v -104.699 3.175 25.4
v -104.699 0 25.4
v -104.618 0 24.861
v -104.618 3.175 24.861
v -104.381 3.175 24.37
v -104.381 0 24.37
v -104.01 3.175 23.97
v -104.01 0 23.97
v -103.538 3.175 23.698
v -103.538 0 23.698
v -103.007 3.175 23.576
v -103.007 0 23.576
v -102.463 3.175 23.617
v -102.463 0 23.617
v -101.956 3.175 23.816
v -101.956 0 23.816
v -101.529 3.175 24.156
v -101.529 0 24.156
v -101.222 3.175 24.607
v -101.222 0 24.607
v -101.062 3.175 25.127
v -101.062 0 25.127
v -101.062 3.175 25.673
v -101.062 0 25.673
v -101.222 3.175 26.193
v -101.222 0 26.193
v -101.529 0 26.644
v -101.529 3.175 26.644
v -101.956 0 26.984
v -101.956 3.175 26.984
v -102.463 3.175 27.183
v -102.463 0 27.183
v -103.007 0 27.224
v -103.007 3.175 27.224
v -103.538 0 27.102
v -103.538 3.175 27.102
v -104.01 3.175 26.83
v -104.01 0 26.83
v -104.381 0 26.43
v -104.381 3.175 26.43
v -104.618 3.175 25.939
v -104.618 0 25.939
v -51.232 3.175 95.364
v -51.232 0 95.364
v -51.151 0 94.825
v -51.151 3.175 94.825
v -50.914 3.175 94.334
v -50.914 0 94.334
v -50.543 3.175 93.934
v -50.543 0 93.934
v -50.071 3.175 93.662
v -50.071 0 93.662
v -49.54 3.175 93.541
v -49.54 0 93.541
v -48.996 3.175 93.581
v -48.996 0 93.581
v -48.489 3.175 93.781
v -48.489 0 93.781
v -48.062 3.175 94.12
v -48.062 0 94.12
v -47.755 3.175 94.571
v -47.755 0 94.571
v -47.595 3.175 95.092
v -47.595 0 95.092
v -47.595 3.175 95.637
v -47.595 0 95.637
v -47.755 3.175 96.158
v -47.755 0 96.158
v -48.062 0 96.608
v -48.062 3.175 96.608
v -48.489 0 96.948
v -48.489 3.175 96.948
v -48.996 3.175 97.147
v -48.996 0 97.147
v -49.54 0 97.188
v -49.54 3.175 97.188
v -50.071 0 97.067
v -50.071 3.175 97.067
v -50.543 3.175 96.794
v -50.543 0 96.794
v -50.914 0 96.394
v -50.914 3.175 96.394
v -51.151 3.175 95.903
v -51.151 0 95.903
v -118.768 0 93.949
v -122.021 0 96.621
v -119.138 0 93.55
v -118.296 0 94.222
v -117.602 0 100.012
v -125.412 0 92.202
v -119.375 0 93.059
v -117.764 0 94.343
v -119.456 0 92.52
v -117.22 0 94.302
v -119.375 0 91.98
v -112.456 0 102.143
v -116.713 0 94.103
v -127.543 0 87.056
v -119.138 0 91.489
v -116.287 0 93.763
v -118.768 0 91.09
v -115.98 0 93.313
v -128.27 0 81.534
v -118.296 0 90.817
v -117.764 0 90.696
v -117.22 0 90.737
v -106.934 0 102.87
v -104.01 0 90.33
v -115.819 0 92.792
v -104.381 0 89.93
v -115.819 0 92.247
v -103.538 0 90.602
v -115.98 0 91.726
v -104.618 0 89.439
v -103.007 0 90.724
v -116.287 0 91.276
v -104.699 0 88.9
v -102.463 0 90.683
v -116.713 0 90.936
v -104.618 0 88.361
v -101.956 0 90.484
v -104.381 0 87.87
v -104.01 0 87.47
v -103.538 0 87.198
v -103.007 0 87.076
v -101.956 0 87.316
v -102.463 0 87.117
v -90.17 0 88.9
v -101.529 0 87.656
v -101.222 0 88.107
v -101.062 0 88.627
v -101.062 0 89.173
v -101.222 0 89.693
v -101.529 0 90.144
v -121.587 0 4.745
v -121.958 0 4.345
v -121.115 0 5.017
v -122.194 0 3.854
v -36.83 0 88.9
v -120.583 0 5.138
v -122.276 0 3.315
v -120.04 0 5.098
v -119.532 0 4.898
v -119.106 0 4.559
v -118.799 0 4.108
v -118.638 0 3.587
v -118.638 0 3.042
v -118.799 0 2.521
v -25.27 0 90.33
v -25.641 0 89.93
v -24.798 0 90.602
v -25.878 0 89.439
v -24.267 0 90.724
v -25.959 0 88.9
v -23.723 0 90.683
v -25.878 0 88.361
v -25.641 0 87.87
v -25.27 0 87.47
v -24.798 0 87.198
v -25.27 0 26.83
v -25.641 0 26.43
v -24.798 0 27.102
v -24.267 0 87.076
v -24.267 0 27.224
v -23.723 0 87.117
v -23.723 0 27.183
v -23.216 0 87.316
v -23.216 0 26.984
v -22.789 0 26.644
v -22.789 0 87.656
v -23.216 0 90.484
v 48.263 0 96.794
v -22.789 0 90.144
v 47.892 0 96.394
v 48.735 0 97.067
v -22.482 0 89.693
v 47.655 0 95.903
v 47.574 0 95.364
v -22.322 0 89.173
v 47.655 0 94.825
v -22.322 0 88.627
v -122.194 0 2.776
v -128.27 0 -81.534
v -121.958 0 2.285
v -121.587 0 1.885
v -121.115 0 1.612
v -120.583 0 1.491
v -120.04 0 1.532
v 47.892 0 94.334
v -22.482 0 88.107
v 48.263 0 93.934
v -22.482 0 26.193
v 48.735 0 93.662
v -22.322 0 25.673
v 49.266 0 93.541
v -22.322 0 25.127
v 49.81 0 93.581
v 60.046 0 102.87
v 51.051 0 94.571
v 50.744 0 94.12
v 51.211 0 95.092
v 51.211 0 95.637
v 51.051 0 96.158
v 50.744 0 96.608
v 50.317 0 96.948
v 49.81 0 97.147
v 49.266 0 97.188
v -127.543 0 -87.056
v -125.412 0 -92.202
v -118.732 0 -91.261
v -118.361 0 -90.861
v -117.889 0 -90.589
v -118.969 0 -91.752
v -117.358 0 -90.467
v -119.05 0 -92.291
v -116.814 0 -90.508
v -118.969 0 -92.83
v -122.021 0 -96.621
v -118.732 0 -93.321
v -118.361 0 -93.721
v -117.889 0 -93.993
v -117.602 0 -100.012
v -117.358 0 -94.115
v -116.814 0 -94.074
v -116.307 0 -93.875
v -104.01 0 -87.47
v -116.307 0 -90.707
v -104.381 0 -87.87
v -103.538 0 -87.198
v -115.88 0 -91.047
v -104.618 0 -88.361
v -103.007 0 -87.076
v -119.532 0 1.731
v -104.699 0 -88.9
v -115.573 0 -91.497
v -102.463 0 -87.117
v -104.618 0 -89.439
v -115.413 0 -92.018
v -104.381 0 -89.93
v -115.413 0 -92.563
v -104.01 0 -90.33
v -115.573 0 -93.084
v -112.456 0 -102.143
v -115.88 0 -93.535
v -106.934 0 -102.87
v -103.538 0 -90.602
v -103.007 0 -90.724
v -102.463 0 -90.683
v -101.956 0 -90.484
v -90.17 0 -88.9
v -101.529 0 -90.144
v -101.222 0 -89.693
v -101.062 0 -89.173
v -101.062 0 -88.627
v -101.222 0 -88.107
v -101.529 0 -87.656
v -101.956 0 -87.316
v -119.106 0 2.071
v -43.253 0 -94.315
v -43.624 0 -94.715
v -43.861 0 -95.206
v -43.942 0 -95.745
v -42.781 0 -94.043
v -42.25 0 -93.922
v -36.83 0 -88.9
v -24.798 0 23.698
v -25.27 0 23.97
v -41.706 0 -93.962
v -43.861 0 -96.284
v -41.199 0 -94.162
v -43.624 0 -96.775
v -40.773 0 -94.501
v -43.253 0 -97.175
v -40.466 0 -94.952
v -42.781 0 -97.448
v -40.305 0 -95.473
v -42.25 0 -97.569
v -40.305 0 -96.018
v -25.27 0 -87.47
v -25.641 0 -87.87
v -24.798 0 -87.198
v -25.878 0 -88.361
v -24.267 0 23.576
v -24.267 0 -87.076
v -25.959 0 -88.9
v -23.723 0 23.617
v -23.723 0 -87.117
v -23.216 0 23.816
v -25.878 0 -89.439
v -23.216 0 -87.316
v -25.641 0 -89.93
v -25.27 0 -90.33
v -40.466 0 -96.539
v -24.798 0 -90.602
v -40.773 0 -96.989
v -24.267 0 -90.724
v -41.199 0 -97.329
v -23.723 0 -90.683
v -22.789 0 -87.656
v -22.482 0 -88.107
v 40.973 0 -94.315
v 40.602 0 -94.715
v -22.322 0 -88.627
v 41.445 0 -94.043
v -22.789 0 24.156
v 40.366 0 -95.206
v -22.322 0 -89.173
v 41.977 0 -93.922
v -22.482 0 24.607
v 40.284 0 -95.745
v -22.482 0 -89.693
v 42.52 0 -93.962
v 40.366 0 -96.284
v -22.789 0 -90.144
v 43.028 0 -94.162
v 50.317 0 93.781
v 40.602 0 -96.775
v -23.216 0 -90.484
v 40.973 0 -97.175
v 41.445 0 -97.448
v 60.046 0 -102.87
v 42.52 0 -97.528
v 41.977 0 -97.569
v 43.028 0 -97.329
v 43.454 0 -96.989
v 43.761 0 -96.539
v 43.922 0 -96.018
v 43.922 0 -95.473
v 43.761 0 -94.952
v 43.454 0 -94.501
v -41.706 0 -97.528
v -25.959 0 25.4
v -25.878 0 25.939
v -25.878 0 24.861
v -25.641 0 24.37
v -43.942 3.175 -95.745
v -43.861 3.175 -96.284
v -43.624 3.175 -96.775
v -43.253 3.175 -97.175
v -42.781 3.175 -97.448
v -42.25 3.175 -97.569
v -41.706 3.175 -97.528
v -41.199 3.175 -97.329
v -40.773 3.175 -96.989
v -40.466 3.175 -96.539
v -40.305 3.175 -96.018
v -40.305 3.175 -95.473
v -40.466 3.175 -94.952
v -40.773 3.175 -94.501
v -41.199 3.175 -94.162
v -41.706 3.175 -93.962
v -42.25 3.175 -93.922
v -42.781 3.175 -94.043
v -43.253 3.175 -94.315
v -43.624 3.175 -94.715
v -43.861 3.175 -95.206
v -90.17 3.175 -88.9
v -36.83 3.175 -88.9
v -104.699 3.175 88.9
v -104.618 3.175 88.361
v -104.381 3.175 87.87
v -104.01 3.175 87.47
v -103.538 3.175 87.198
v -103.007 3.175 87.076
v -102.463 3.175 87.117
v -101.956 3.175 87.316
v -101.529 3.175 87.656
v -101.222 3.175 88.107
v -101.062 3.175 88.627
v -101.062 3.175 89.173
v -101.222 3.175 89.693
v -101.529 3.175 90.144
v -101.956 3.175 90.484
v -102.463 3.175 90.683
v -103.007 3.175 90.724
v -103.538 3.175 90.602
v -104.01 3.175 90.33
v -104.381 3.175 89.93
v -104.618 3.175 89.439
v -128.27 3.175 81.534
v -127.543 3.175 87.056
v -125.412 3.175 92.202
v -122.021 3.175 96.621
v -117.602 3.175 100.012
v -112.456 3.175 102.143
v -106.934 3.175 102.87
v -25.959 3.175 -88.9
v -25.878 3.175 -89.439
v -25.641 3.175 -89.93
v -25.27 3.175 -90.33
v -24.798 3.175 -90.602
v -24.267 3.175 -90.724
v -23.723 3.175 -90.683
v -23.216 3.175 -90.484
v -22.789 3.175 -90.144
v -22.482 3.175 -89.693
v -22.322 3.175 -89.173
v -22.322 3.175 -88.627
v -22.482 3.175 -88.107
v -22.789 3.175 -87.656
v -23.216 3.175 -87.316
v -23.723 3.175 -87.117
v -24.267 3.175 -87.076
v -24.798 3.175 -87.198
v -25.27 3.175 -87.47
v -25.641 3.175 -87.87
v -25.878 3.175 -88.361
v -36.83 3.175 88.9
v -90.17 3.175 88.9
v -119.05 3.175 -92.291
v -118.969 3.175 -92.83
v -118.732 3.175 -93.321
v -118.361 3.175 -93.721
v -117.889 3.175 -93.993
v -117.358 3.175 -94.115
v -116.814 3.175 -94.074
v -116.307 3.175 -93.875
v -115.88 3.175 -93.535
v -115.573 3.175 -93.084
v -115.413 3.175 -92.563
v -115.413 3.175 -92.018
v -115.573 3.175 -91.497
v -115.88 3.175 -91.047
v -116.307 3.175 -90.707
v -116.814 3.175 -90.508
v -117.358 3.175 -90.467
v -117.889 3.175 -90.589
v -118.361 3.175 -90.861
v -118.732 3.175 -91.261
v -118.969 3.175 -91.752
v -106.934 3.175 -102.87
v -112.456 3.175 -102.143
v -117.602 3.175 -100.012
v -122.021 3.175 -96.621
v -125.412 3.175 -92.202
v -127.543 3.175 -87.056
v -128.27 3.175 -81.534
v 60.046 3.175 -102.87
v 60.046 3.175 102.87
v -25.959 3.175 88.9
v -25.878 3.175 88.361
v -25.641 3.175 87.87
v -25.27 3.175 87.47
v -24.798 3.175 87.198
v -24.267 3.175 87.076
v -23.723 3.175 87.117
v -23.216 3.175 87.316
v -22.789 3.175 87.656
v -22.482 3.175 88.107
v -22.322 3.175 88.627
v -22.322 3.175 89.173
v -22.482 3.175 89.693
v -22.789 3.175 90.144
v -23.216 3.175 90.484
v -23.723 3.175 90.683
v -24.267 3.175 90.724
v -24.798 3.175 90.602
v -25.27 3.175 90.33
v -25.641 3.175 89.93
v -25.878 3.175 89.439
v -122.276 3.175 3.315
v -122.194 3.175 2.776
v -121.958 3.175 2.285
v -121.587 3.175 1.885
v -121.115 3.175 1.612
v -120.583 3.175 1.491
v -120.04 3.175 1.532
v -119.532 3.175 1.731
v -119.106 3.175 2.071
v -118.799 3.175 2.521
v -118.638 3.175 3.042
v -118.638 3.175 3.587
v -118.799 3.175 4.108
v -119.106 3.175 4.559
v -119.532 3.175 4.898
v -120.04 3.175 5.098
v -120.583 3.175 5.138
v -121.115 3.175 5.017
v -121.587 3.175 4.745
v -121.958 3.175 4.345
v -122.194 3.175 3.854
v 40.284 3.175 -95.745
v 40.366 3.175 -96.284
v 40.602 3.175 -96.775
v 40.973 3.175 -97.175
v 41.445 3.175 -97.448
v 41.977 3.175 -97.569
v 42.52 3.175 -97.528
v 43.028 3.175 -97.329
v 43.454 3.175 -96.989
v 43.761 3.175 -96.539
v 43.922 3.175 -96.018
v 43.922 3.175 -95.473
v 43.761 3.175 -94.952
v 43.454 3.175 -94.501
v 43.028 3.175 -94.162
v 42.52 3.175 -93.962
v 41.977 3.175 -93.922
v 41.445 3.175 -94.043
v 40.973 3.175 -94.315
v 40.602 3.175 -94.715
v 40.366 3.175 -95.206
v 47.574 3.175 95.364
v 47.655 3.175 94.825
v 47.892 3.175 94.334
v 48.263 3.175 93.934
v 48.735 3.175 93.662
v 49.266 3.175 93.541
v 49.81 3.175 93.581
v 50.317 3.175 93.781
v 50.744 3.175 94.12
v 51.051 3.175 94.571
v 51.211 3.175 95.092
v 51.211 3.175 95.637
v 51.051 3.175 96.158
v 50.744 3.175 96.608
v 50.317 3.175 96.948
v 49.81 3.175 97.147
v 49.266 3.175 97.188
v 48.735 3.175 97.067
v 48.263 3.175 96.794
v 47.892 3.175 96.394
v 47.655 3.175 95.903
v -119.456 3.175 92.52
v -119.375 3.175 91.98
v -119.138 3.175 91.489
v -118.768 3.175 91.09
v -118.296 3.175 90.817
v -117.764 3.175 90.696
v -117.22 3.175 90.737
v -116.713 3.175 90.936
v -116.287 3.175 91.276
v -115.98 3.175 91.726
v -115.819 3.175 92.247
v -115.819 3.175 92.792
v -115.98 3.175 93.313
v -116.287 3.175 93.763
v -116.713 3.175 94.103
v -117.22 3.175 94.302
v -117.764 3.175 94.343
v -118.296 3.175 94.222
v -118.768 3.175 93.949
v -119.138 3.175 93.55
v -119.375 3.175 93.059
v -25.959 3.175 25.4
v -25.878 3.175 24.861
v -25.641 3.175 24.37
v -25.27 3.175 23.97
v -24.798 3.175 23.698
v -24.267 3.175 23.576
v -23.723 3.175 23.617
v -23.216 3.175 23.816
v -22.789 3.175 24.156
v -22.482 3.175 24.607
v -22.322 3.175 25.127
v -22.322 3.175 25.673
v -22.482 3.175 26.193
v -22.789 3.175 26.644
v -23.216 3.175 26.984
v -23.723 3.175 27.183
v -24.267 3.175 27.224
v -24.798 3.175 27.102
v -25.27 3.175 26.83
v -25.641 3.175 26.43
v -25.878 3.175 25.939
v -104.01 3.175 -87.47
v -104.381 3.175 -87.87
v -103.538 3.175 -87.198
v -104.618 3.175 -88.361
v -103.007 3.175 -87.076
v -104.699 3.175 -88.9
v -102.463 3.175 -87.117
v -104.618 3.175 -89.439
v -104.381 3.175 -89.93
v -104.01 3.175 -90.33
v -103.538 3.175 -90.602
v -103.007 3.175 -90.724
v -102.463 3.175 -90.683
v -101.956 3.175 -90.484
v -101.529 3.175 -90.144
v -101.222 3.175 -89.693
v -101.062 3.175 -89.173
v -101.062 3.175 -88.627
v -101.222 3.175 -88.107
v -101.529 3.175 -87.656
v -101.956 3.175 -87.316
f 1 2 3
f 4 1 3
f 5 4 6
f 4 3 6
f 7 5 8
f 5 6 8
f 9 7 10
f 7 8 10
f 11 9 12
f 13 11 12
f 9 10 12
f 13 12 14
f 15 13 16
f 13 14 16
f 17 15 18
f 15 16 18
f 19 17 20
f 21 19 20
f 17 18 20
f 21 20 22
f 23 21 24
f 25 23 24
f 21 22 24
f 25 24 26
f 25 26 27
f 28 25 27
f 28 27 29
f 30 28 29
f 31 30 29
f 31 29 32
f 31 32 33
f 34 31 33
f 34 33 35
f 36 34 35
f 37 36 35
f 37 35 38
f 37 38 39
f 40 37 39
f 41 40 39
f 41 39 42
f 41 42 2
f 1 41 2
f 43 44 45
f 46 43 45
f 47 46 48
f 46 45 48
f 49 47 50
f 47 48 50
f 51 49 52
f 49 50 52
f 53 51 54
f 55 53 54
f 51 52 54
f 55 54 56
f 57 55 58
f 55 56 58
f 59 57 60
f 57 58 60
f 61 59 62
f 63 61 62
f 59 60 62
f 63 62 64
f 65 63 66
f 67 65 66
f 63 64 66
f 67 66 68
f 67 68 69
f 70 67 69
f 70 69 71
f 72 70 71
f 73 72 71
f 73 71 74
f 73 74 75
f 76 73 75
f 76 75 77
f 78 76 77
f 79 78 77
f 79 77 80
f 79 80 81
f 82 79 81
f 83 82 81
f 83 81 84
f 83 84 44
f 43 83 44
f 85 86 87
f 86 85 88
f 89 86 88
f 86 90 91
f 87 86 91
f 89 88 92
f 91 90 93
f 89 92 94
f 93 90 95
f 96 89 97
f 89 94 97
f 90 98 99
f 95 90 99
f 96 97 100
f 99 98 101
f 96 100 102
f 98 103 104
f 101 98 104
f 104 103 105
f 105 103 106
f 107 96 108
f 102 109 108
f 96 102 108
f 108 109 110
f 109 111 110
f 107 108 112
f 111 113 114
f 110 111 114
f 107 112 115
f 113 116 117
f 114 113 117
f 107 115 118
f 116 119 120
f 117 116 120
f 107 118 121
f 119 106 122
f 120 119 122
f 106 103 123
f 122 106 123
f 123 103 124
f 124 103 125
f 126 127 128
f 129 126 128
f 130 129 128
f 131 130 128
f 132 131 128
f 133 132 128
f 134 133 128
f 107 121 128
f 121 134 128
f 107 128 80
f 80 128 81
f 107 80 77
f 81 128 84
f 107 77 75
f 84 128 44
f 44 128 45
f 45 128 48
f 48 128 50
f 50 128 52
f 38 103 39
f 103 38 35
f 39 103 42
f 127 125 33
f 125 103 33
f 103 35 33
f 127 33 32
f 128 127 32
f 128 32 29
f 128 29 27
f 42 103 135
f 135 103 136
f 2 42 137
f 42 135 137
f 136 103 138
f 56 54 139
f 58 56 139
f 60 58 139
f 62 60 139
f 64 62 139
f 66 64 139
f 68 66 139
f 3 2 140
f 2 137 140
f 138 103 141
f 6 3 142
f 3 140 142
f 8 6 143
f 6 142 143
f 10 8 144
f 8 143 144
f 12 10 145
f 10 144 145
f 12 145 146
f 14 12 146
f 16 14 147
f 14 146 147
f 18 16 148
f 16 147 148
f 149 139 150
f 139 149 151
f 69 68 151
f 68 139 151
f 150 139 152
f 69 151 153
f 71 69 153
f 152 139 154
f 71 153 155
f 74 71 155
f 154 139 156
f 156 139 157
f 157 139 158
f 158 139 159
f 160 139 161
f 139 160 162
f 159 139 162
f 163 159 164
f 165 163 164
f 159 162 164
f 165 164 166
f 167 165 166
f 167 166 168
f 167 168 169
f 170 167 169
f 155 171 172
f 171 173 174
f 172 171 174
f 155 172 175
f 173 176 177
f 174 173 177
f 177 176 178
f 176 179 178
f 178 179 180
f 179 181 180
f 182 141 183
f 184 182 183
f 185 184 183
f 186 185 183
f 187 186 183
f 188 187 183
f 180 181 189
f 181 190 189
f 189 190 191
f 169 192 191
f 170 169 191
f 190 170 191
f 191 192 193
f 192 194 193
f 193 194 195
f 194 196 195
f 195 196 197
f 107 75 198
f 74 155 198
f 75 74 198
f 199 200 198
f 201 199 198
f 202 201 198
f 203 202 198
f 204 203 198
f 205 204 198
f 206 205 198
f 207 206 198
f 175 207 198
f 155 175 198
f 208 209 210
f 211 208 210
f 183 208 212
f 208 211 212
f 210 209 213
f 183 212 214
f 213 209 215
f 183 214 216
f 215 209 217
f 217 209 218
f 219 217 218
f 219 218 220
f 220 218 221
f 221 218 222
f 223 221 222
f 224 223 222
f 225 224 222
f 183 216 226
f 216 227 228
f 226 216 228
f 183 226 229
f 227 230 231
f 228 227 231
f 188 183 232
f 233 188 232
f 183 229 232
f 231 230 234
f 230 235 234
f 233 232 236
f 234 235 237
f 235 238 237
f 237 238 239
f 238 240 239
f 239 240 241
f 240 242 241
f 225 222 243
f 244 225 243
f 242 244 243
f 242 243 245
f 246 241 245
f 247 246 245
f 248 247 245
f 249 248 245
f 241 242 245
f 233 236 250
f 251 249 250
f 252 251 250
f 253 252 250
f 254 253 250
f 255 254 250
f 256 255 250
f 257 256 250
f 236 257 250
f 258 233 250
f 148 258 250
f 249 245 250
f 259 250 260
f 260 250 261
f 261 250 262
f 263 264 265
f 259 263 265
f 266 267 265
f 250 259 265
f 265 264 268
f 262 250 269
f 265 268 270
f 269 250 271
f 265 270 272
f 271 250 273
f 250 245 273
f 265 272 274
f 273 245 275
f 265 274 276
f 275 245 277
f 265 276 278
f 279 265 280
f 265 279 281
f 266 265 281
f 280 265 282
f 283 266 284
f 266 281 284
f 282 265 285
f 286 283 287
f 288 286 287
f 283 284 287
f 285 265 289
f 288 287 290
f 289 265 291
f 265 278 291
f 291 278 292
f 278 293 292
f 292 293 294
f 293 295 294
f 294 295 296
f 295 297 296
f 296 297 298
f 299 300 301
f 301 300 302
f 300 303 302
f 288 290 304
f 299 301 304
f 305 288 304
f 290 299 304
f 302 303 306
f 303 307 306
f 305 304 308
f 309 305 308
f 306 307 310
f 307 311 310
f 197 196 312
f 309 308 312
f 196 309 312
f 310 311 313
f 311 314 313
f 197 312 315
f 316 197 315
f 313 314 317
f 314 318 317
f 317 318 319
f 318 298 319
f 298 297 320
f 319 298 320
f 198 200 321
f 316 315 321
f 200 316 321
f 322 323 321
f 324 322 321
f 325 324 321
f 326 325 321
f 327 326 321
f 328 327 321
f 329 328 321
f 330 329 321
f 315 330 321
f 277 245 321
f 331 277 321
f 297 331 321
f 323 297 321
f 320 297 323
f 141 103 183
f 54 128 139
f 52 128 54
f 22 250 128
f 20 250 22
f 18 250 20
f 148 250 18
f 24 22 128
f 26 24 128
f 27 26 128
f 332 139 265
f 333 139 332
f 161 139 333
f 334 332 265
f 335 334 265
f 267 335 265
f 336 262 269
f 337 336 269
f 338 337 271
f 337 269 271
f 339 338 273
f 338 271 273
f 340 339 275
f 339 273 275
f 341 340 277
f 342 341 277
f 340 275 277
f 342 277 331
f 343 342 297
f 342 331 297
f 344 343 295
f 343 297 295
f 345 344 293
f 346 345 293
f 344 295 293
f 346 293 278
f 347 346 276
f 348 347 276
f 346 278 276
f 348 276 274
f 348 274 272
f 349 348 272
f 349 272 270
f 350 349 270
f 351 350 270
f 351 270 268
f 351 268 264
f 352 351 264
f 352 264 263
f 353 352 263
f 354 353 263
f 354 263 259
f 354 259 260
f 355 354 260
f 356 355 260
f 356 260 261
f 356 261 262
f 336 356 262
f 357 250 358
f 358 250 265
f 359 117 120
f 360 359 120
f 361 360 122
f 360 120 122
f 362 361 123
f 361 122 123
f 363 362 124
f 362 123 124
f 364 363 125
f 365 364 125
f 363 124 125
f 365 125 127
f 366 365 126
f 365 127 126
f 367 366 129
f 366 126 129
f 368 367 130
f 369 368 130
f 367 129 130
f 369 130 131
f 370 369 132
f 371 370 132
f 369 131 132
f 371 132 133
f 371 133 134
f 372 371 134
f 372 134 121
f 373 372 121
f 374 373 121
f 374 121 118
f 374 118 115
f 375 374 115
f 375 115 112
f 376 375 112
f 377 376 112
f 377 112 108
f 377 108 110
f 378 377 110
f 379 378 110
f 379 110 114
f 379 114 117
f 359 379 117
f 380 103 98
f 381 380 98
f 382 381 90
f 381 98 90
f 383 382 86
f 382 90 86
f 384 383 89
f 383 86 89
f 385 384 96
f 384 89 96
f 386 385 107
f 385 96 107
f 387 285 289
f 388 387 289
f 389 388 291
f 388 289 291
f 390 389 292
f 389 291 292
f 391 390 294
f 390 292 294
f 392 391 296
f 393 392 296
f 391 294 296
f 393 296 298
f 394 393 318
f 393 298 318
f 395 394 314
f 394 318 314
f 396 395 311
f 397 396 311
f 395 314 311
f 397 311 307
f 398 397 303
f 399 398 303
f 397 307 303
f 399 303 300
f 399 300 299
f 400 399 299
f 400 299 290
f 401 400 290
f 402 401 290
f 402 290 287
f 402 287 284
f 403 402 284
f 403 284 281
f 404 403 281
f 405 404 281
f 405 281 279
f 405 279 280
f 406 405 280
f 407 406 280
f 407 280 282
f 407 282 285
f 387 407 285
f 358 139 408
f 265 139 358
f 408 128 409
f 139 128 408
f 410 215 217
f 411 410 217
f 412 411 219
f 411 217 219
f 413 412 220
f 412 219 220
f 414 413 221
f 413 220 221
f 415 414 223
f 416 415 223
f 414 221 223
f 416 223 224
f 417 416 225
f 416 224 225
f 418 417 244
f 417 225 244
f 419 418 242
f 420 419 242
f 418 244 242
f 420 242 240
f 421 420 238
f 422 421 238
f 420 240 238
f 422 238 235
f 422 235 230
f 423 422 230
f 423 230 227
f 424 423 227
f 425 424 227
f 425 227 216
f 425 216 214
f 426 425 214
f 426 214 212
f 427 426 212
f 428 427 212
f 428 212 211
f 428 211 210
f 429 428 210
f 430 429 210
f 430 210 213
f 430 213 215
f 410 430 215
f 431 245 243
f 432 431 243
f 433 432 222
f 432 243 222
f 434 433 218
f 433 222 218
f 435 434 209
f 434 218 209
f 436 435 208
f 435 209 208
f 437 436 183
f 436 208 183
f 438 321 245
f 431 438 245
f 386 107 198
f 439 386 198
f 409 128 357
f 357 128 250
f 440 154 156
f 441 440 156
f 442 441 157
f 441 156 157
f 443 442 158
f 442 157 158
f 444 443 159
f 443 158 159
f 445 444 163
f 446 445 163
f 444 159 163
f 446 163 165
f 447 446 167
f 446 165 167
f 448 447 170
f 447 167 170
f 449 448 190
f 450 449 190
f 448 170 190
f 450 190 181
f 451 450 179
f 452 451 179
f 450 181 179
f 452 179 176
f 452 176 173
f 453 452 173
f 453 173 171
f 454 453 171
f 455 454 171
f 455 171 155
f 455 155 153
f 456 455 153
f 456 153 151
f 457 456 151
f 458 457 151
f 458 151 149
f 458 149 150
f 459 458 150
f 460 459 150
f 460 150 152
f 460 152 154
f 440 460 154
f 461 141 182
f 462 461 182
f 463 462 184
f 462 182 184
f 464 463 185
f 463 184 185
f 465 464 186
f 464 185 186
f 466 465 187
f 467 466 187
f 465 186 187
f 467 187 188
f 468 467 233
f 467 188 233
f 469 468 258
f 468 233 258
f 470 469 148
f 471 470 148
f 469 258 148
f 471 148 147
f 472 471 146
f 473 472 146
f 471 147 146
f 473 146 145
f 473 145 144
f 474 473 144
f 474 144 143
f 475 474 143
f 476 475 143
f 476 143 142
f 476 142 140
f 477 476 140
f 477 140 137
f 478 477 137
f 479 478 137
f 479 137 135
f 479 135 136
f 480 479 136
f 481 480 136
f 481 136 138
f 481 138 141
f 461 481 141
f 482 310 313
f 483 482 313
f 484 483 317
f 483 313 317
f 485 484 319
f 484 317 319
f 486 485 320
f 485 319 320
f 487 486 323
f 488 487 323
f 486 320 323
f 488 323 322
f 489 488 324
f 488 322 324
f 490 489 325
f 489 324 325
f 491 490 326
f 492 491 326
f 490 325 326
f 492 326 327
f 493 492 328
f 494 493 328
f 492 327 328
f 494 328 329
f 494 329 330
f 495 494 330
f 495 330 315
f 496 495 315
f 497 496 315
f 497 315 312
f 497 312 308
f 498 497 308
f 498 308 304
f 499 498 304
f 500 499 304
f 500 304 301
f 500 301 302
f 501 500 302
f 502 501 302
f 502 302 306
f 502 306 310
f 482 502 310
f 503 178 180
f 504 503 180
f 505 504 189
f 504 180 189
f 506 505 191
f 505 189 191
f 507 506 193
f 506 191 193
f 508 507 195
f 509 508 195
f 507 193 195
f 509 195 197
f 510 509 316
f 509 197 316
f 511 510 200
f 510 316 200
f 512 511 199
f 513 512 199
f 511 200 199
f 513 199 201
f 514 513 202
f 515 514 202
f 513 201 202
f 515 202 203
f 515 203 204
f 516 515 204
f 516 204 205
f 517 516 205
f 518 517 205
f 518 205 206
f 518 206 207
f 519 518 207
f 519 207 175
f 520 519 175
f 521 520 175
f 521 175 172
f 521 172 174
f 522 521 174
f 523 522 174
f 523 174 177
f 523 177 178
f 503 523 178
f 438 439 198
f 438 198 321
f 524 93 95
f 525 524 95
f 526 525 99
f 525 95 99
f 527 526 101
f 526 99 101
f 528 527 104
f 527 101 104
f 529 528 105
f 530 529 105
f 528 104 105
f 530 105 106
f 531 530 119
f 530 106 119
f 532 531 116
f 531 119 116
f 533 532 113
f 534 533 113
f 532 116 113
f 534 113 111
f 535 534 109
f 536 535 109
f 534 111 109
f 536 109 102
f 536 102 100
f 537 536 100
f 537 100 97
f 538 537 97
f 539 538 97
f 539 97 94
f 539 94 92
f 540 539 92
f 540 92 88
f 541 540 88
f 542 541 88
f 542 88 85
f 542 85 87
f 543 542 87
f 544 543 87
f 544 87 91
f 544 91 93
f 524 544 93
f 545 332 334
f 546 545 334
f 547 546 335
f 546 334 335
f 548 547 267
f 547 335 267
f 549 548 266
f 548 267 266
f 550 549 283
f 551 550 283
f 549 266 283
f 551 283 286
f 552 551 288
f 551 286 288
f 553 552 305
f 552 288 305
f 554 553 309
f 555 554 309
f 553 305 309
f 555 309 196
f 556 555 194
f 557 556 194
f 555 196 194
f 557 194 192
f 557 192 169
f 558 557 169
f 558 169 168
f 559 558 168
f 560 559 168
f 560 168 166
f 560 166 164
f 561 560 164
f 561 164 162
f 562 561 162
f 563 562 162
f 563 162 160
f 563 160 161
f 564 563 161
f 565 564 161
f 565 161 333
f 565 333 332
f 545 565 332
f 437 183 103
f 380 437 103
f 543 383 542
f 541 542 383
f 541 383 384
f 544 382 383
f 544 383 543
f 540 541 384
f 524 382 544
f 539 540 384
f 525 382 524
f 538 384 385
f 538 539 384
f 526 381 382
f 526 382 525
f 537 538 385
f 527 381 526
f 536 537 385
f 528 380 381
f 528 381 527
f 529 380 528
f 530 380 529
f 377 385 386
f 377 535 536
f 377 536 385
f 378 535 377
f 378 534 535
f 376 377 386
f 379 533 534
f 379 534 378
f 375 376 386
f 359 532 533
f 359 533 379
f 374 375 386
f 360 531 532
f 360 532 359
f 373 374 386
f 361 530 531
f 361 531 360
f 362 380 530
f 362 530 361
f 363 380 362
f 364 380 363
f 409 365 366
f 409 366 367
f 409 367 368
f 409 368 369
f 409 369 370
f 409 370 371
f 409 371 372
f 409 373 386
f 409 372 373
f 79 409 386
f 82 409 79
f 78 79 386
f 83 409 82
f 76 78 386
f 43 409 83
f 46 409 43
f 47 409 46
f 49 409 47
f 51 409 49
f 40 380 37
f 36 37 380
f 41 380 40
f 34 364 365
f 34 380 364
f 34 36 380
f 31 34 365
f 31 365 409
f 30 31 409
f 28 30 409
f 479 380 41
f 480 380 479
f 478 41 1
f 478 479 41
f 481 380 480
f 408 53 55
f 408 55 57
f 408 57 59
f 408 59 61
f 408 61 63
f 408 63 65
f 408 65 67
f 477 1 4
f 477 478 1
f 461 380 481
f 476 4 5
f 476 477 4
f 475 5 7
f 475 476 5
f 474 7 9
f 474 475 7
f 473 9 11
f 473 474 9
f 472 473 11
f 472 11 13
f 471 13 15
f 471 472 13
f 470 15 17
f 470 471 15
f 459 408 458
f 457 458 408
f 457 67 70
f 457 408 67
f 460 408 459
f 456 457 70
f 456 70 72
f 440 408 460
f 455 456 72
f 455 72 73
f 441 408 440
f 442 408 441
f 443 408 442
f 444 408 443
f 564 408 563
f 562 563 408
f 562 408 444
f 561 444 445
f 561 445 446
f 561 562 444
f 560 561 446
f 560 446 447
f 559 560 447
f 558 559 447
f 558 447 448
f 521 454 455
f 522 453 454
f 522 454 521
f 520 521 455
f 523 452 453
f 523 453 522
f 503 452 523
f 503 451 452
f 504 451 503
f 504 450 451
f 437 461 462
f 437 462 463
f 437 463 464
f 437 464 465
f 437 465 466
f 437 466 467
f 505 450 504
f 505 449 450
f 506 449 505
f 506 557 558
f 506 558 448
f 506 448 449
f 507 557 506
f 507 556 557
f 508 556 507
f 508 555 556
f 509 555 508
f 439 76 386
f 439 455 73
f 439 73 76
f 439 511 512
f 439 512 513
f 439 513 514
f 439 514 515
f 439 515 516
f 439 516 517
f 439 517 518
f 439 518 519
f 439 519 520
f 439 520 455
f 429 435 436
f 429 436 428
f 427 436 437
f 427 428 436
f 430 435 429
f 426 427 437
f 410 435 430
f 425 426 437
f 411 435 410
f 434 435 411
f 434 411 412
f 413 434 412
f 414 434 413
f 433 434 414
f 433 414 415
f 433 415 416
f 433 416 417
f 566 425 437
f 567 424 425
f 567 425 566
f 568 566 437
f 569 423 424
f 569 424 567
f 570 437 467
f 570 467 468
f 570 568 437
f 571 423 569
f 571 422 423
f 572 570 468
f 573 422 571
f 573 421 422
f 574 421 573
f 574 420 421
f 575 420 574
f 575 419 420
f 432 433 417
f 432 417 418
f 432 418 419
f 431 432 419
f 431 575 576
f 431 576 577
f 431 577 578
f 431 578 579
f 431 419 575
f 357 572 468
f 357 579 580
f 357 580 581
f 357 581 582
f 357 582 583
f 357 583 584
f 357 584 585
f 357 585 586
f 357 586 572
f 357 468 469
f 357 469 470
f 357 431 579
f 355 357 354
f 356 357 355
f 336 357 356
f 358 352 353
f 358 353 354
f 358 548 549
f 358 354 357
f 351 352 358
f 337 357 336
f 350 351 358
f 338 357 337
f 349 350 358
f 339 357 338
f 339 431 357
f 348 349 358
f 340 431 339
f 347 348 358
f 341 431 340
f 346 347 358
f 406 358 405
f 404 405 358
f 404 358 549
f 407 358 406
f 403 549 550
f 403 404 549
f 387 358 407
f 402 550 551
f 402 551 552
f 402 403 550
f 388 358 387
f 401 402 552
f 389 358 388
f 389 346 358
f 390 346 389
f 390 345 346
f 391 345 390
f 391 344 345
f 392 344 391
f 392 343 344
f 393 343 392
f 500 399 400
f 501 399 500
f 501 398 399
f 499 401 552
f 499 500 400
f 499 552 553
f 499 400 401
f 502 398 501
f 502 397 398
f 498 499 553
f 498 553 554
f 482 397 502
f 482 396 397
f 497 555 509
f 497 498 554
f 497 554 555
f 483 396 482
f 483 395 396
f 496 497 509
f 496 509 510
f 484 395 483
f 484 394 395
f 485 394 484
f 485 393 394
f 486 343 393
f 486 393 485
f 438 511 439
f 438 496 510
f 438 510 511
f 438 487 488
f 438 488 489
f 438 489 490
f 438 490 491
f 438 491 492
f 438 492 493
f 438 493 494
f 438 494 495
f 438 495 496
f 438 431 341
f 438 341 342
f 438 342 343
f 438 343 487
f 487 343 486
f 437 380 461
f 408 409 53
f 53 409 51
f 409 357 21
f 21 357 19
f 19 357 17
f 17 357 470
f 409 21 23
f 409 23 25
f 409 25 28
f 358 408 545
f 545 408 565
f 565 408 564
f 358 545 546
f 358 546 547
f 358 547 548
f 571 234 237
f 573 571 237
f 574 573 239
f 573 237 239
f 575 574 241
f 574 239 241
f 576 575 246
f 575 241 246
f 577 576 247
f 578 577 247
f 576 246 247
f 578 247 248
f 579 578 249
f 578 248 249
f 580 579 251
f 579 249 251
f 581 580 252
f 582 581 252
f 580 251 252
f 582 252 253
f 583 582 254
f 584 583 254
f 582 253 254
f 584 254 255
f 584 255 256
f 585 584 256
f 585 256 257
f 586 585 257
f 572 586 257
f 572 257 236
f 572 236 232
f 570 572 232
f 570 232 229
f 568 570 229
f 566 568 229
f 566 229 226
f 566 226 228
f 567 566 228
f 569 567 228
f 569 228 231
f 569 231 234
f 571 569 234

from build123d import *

# Parameters (mm, degrees)
BOSS_EXTRUDE1_DEPTH         = 3.175
SKETCH3_W                   = 53.34
SKETCH3_H                   = 177.8
CUT_EXTRUDE1_DEPTH          = 3.175
F_27_0_144_DIAMETER_HOLE2_D = 3.6576
F_27_0_144_DIAMETER_HOLE3_D = 3.6576
SKETCH12_W                  = 127
SKETCH12_H                  = 254
CUT_EXTRUDE2_DEPTH          = 25.4


with BuildPart() as part:
    # Sketch2 → Boss-Extrude1 (new body)
    with BuildSketch(Plane(origin=(0, 0, 0), x_dir=(1, 0, 0), z_dir=(0, 1, 0))):
        with BuildLine():
            Line((-106.934, -102.87), (106.934, -102.87))
            ThreePointArc((106.934, -102.87), (122.020830283, -96.620830283), (128.27, -81.534))
            Line((128.27, -81.534), (128.27, 81.534))
            ThreePointArc((128.27, 81.534), (122.020830283, 96.620830283), (106.934, 102.87))
            Line((106.934, 102.87), (-106.934, 102.87))
            ThreePointArc((-106.934, 102.87), (-122.020830283, 96.620830283), (-128.27, 81.534))
            Line((-128.27, 81.534), (-128.27, -81.534))
            ThreePointArc((-128.27, -81.534), (-122.020830283, -96.620830283), (-106.934, -102.87))
        make_face()
    extrude(amount=BOSS_EXTRUDE1_DEPTH)

    # Sketch3 → Cut-Extrude1 (cut)
    with BuildSketch(Plane(origin=(0, 0, 0), x_dir=(1, 0, 0), z_dir=(0, 1, 0))):
        with Locations((-63.5, 0)):
            Rectangle(SKETCH3_W, SKETCH3_H)
    extrude(amount=CUT_EXTRUDE1_DEPTH, mode=Mode.SUBTRACT)

    # #27 (0.144) Diameter Hole2 (through all)
    with Locations(Plane(origin=(0, 3.175, 0), x_dir=(1, 0, 0), z_dir=(0, 1, 0))):
        with Locations((-24.13, -25.4), (-24.13, 88.9), (-102.87, 88.9), (-102.87, -25.4), (-102.87, -88.9), (-24.13, -88.9)):
            Hole(F_27_0_144_DIAMETER_HOLE2_D / 2)

    # #27 (0.144) Diameter Hole3 (through all)
    with Locations(Plane(origin=(0, 3.175, 0), x_dir=(1, 0, 0), z_dir=(0, 1, 0))):
        with Locations((-42.1132, 95.7453), (42.1132, 95.7453), (117.221, 92.2909), (117.6274, -92.5195), (49.403, -95.3643), (120.4468, -3.3147), (-49.403, -95.3643), (-117.6274, -92.5195), (-120.4468, -3.3147), (-117.221, 92.2909)):
            Hole(F_27_0_144_DIAMETER_HOLE3_D / 2)

    # Sketch12 → Cut-Extrude2 (cut)
    with BuildSketch(Plane(origin=(0, 3.175, 0), x_dir=(1, 0, 0), z_dir=(0, 1, 0))):
        with Locations((123.5456, 0)):
            Rectangle(SKETCH12_W, SKETCH12_H)
    extrude(amount=-CUT_EXTRUDE2_DEPTH, mode=Mode.SUBTRACT)


solid = part.part
